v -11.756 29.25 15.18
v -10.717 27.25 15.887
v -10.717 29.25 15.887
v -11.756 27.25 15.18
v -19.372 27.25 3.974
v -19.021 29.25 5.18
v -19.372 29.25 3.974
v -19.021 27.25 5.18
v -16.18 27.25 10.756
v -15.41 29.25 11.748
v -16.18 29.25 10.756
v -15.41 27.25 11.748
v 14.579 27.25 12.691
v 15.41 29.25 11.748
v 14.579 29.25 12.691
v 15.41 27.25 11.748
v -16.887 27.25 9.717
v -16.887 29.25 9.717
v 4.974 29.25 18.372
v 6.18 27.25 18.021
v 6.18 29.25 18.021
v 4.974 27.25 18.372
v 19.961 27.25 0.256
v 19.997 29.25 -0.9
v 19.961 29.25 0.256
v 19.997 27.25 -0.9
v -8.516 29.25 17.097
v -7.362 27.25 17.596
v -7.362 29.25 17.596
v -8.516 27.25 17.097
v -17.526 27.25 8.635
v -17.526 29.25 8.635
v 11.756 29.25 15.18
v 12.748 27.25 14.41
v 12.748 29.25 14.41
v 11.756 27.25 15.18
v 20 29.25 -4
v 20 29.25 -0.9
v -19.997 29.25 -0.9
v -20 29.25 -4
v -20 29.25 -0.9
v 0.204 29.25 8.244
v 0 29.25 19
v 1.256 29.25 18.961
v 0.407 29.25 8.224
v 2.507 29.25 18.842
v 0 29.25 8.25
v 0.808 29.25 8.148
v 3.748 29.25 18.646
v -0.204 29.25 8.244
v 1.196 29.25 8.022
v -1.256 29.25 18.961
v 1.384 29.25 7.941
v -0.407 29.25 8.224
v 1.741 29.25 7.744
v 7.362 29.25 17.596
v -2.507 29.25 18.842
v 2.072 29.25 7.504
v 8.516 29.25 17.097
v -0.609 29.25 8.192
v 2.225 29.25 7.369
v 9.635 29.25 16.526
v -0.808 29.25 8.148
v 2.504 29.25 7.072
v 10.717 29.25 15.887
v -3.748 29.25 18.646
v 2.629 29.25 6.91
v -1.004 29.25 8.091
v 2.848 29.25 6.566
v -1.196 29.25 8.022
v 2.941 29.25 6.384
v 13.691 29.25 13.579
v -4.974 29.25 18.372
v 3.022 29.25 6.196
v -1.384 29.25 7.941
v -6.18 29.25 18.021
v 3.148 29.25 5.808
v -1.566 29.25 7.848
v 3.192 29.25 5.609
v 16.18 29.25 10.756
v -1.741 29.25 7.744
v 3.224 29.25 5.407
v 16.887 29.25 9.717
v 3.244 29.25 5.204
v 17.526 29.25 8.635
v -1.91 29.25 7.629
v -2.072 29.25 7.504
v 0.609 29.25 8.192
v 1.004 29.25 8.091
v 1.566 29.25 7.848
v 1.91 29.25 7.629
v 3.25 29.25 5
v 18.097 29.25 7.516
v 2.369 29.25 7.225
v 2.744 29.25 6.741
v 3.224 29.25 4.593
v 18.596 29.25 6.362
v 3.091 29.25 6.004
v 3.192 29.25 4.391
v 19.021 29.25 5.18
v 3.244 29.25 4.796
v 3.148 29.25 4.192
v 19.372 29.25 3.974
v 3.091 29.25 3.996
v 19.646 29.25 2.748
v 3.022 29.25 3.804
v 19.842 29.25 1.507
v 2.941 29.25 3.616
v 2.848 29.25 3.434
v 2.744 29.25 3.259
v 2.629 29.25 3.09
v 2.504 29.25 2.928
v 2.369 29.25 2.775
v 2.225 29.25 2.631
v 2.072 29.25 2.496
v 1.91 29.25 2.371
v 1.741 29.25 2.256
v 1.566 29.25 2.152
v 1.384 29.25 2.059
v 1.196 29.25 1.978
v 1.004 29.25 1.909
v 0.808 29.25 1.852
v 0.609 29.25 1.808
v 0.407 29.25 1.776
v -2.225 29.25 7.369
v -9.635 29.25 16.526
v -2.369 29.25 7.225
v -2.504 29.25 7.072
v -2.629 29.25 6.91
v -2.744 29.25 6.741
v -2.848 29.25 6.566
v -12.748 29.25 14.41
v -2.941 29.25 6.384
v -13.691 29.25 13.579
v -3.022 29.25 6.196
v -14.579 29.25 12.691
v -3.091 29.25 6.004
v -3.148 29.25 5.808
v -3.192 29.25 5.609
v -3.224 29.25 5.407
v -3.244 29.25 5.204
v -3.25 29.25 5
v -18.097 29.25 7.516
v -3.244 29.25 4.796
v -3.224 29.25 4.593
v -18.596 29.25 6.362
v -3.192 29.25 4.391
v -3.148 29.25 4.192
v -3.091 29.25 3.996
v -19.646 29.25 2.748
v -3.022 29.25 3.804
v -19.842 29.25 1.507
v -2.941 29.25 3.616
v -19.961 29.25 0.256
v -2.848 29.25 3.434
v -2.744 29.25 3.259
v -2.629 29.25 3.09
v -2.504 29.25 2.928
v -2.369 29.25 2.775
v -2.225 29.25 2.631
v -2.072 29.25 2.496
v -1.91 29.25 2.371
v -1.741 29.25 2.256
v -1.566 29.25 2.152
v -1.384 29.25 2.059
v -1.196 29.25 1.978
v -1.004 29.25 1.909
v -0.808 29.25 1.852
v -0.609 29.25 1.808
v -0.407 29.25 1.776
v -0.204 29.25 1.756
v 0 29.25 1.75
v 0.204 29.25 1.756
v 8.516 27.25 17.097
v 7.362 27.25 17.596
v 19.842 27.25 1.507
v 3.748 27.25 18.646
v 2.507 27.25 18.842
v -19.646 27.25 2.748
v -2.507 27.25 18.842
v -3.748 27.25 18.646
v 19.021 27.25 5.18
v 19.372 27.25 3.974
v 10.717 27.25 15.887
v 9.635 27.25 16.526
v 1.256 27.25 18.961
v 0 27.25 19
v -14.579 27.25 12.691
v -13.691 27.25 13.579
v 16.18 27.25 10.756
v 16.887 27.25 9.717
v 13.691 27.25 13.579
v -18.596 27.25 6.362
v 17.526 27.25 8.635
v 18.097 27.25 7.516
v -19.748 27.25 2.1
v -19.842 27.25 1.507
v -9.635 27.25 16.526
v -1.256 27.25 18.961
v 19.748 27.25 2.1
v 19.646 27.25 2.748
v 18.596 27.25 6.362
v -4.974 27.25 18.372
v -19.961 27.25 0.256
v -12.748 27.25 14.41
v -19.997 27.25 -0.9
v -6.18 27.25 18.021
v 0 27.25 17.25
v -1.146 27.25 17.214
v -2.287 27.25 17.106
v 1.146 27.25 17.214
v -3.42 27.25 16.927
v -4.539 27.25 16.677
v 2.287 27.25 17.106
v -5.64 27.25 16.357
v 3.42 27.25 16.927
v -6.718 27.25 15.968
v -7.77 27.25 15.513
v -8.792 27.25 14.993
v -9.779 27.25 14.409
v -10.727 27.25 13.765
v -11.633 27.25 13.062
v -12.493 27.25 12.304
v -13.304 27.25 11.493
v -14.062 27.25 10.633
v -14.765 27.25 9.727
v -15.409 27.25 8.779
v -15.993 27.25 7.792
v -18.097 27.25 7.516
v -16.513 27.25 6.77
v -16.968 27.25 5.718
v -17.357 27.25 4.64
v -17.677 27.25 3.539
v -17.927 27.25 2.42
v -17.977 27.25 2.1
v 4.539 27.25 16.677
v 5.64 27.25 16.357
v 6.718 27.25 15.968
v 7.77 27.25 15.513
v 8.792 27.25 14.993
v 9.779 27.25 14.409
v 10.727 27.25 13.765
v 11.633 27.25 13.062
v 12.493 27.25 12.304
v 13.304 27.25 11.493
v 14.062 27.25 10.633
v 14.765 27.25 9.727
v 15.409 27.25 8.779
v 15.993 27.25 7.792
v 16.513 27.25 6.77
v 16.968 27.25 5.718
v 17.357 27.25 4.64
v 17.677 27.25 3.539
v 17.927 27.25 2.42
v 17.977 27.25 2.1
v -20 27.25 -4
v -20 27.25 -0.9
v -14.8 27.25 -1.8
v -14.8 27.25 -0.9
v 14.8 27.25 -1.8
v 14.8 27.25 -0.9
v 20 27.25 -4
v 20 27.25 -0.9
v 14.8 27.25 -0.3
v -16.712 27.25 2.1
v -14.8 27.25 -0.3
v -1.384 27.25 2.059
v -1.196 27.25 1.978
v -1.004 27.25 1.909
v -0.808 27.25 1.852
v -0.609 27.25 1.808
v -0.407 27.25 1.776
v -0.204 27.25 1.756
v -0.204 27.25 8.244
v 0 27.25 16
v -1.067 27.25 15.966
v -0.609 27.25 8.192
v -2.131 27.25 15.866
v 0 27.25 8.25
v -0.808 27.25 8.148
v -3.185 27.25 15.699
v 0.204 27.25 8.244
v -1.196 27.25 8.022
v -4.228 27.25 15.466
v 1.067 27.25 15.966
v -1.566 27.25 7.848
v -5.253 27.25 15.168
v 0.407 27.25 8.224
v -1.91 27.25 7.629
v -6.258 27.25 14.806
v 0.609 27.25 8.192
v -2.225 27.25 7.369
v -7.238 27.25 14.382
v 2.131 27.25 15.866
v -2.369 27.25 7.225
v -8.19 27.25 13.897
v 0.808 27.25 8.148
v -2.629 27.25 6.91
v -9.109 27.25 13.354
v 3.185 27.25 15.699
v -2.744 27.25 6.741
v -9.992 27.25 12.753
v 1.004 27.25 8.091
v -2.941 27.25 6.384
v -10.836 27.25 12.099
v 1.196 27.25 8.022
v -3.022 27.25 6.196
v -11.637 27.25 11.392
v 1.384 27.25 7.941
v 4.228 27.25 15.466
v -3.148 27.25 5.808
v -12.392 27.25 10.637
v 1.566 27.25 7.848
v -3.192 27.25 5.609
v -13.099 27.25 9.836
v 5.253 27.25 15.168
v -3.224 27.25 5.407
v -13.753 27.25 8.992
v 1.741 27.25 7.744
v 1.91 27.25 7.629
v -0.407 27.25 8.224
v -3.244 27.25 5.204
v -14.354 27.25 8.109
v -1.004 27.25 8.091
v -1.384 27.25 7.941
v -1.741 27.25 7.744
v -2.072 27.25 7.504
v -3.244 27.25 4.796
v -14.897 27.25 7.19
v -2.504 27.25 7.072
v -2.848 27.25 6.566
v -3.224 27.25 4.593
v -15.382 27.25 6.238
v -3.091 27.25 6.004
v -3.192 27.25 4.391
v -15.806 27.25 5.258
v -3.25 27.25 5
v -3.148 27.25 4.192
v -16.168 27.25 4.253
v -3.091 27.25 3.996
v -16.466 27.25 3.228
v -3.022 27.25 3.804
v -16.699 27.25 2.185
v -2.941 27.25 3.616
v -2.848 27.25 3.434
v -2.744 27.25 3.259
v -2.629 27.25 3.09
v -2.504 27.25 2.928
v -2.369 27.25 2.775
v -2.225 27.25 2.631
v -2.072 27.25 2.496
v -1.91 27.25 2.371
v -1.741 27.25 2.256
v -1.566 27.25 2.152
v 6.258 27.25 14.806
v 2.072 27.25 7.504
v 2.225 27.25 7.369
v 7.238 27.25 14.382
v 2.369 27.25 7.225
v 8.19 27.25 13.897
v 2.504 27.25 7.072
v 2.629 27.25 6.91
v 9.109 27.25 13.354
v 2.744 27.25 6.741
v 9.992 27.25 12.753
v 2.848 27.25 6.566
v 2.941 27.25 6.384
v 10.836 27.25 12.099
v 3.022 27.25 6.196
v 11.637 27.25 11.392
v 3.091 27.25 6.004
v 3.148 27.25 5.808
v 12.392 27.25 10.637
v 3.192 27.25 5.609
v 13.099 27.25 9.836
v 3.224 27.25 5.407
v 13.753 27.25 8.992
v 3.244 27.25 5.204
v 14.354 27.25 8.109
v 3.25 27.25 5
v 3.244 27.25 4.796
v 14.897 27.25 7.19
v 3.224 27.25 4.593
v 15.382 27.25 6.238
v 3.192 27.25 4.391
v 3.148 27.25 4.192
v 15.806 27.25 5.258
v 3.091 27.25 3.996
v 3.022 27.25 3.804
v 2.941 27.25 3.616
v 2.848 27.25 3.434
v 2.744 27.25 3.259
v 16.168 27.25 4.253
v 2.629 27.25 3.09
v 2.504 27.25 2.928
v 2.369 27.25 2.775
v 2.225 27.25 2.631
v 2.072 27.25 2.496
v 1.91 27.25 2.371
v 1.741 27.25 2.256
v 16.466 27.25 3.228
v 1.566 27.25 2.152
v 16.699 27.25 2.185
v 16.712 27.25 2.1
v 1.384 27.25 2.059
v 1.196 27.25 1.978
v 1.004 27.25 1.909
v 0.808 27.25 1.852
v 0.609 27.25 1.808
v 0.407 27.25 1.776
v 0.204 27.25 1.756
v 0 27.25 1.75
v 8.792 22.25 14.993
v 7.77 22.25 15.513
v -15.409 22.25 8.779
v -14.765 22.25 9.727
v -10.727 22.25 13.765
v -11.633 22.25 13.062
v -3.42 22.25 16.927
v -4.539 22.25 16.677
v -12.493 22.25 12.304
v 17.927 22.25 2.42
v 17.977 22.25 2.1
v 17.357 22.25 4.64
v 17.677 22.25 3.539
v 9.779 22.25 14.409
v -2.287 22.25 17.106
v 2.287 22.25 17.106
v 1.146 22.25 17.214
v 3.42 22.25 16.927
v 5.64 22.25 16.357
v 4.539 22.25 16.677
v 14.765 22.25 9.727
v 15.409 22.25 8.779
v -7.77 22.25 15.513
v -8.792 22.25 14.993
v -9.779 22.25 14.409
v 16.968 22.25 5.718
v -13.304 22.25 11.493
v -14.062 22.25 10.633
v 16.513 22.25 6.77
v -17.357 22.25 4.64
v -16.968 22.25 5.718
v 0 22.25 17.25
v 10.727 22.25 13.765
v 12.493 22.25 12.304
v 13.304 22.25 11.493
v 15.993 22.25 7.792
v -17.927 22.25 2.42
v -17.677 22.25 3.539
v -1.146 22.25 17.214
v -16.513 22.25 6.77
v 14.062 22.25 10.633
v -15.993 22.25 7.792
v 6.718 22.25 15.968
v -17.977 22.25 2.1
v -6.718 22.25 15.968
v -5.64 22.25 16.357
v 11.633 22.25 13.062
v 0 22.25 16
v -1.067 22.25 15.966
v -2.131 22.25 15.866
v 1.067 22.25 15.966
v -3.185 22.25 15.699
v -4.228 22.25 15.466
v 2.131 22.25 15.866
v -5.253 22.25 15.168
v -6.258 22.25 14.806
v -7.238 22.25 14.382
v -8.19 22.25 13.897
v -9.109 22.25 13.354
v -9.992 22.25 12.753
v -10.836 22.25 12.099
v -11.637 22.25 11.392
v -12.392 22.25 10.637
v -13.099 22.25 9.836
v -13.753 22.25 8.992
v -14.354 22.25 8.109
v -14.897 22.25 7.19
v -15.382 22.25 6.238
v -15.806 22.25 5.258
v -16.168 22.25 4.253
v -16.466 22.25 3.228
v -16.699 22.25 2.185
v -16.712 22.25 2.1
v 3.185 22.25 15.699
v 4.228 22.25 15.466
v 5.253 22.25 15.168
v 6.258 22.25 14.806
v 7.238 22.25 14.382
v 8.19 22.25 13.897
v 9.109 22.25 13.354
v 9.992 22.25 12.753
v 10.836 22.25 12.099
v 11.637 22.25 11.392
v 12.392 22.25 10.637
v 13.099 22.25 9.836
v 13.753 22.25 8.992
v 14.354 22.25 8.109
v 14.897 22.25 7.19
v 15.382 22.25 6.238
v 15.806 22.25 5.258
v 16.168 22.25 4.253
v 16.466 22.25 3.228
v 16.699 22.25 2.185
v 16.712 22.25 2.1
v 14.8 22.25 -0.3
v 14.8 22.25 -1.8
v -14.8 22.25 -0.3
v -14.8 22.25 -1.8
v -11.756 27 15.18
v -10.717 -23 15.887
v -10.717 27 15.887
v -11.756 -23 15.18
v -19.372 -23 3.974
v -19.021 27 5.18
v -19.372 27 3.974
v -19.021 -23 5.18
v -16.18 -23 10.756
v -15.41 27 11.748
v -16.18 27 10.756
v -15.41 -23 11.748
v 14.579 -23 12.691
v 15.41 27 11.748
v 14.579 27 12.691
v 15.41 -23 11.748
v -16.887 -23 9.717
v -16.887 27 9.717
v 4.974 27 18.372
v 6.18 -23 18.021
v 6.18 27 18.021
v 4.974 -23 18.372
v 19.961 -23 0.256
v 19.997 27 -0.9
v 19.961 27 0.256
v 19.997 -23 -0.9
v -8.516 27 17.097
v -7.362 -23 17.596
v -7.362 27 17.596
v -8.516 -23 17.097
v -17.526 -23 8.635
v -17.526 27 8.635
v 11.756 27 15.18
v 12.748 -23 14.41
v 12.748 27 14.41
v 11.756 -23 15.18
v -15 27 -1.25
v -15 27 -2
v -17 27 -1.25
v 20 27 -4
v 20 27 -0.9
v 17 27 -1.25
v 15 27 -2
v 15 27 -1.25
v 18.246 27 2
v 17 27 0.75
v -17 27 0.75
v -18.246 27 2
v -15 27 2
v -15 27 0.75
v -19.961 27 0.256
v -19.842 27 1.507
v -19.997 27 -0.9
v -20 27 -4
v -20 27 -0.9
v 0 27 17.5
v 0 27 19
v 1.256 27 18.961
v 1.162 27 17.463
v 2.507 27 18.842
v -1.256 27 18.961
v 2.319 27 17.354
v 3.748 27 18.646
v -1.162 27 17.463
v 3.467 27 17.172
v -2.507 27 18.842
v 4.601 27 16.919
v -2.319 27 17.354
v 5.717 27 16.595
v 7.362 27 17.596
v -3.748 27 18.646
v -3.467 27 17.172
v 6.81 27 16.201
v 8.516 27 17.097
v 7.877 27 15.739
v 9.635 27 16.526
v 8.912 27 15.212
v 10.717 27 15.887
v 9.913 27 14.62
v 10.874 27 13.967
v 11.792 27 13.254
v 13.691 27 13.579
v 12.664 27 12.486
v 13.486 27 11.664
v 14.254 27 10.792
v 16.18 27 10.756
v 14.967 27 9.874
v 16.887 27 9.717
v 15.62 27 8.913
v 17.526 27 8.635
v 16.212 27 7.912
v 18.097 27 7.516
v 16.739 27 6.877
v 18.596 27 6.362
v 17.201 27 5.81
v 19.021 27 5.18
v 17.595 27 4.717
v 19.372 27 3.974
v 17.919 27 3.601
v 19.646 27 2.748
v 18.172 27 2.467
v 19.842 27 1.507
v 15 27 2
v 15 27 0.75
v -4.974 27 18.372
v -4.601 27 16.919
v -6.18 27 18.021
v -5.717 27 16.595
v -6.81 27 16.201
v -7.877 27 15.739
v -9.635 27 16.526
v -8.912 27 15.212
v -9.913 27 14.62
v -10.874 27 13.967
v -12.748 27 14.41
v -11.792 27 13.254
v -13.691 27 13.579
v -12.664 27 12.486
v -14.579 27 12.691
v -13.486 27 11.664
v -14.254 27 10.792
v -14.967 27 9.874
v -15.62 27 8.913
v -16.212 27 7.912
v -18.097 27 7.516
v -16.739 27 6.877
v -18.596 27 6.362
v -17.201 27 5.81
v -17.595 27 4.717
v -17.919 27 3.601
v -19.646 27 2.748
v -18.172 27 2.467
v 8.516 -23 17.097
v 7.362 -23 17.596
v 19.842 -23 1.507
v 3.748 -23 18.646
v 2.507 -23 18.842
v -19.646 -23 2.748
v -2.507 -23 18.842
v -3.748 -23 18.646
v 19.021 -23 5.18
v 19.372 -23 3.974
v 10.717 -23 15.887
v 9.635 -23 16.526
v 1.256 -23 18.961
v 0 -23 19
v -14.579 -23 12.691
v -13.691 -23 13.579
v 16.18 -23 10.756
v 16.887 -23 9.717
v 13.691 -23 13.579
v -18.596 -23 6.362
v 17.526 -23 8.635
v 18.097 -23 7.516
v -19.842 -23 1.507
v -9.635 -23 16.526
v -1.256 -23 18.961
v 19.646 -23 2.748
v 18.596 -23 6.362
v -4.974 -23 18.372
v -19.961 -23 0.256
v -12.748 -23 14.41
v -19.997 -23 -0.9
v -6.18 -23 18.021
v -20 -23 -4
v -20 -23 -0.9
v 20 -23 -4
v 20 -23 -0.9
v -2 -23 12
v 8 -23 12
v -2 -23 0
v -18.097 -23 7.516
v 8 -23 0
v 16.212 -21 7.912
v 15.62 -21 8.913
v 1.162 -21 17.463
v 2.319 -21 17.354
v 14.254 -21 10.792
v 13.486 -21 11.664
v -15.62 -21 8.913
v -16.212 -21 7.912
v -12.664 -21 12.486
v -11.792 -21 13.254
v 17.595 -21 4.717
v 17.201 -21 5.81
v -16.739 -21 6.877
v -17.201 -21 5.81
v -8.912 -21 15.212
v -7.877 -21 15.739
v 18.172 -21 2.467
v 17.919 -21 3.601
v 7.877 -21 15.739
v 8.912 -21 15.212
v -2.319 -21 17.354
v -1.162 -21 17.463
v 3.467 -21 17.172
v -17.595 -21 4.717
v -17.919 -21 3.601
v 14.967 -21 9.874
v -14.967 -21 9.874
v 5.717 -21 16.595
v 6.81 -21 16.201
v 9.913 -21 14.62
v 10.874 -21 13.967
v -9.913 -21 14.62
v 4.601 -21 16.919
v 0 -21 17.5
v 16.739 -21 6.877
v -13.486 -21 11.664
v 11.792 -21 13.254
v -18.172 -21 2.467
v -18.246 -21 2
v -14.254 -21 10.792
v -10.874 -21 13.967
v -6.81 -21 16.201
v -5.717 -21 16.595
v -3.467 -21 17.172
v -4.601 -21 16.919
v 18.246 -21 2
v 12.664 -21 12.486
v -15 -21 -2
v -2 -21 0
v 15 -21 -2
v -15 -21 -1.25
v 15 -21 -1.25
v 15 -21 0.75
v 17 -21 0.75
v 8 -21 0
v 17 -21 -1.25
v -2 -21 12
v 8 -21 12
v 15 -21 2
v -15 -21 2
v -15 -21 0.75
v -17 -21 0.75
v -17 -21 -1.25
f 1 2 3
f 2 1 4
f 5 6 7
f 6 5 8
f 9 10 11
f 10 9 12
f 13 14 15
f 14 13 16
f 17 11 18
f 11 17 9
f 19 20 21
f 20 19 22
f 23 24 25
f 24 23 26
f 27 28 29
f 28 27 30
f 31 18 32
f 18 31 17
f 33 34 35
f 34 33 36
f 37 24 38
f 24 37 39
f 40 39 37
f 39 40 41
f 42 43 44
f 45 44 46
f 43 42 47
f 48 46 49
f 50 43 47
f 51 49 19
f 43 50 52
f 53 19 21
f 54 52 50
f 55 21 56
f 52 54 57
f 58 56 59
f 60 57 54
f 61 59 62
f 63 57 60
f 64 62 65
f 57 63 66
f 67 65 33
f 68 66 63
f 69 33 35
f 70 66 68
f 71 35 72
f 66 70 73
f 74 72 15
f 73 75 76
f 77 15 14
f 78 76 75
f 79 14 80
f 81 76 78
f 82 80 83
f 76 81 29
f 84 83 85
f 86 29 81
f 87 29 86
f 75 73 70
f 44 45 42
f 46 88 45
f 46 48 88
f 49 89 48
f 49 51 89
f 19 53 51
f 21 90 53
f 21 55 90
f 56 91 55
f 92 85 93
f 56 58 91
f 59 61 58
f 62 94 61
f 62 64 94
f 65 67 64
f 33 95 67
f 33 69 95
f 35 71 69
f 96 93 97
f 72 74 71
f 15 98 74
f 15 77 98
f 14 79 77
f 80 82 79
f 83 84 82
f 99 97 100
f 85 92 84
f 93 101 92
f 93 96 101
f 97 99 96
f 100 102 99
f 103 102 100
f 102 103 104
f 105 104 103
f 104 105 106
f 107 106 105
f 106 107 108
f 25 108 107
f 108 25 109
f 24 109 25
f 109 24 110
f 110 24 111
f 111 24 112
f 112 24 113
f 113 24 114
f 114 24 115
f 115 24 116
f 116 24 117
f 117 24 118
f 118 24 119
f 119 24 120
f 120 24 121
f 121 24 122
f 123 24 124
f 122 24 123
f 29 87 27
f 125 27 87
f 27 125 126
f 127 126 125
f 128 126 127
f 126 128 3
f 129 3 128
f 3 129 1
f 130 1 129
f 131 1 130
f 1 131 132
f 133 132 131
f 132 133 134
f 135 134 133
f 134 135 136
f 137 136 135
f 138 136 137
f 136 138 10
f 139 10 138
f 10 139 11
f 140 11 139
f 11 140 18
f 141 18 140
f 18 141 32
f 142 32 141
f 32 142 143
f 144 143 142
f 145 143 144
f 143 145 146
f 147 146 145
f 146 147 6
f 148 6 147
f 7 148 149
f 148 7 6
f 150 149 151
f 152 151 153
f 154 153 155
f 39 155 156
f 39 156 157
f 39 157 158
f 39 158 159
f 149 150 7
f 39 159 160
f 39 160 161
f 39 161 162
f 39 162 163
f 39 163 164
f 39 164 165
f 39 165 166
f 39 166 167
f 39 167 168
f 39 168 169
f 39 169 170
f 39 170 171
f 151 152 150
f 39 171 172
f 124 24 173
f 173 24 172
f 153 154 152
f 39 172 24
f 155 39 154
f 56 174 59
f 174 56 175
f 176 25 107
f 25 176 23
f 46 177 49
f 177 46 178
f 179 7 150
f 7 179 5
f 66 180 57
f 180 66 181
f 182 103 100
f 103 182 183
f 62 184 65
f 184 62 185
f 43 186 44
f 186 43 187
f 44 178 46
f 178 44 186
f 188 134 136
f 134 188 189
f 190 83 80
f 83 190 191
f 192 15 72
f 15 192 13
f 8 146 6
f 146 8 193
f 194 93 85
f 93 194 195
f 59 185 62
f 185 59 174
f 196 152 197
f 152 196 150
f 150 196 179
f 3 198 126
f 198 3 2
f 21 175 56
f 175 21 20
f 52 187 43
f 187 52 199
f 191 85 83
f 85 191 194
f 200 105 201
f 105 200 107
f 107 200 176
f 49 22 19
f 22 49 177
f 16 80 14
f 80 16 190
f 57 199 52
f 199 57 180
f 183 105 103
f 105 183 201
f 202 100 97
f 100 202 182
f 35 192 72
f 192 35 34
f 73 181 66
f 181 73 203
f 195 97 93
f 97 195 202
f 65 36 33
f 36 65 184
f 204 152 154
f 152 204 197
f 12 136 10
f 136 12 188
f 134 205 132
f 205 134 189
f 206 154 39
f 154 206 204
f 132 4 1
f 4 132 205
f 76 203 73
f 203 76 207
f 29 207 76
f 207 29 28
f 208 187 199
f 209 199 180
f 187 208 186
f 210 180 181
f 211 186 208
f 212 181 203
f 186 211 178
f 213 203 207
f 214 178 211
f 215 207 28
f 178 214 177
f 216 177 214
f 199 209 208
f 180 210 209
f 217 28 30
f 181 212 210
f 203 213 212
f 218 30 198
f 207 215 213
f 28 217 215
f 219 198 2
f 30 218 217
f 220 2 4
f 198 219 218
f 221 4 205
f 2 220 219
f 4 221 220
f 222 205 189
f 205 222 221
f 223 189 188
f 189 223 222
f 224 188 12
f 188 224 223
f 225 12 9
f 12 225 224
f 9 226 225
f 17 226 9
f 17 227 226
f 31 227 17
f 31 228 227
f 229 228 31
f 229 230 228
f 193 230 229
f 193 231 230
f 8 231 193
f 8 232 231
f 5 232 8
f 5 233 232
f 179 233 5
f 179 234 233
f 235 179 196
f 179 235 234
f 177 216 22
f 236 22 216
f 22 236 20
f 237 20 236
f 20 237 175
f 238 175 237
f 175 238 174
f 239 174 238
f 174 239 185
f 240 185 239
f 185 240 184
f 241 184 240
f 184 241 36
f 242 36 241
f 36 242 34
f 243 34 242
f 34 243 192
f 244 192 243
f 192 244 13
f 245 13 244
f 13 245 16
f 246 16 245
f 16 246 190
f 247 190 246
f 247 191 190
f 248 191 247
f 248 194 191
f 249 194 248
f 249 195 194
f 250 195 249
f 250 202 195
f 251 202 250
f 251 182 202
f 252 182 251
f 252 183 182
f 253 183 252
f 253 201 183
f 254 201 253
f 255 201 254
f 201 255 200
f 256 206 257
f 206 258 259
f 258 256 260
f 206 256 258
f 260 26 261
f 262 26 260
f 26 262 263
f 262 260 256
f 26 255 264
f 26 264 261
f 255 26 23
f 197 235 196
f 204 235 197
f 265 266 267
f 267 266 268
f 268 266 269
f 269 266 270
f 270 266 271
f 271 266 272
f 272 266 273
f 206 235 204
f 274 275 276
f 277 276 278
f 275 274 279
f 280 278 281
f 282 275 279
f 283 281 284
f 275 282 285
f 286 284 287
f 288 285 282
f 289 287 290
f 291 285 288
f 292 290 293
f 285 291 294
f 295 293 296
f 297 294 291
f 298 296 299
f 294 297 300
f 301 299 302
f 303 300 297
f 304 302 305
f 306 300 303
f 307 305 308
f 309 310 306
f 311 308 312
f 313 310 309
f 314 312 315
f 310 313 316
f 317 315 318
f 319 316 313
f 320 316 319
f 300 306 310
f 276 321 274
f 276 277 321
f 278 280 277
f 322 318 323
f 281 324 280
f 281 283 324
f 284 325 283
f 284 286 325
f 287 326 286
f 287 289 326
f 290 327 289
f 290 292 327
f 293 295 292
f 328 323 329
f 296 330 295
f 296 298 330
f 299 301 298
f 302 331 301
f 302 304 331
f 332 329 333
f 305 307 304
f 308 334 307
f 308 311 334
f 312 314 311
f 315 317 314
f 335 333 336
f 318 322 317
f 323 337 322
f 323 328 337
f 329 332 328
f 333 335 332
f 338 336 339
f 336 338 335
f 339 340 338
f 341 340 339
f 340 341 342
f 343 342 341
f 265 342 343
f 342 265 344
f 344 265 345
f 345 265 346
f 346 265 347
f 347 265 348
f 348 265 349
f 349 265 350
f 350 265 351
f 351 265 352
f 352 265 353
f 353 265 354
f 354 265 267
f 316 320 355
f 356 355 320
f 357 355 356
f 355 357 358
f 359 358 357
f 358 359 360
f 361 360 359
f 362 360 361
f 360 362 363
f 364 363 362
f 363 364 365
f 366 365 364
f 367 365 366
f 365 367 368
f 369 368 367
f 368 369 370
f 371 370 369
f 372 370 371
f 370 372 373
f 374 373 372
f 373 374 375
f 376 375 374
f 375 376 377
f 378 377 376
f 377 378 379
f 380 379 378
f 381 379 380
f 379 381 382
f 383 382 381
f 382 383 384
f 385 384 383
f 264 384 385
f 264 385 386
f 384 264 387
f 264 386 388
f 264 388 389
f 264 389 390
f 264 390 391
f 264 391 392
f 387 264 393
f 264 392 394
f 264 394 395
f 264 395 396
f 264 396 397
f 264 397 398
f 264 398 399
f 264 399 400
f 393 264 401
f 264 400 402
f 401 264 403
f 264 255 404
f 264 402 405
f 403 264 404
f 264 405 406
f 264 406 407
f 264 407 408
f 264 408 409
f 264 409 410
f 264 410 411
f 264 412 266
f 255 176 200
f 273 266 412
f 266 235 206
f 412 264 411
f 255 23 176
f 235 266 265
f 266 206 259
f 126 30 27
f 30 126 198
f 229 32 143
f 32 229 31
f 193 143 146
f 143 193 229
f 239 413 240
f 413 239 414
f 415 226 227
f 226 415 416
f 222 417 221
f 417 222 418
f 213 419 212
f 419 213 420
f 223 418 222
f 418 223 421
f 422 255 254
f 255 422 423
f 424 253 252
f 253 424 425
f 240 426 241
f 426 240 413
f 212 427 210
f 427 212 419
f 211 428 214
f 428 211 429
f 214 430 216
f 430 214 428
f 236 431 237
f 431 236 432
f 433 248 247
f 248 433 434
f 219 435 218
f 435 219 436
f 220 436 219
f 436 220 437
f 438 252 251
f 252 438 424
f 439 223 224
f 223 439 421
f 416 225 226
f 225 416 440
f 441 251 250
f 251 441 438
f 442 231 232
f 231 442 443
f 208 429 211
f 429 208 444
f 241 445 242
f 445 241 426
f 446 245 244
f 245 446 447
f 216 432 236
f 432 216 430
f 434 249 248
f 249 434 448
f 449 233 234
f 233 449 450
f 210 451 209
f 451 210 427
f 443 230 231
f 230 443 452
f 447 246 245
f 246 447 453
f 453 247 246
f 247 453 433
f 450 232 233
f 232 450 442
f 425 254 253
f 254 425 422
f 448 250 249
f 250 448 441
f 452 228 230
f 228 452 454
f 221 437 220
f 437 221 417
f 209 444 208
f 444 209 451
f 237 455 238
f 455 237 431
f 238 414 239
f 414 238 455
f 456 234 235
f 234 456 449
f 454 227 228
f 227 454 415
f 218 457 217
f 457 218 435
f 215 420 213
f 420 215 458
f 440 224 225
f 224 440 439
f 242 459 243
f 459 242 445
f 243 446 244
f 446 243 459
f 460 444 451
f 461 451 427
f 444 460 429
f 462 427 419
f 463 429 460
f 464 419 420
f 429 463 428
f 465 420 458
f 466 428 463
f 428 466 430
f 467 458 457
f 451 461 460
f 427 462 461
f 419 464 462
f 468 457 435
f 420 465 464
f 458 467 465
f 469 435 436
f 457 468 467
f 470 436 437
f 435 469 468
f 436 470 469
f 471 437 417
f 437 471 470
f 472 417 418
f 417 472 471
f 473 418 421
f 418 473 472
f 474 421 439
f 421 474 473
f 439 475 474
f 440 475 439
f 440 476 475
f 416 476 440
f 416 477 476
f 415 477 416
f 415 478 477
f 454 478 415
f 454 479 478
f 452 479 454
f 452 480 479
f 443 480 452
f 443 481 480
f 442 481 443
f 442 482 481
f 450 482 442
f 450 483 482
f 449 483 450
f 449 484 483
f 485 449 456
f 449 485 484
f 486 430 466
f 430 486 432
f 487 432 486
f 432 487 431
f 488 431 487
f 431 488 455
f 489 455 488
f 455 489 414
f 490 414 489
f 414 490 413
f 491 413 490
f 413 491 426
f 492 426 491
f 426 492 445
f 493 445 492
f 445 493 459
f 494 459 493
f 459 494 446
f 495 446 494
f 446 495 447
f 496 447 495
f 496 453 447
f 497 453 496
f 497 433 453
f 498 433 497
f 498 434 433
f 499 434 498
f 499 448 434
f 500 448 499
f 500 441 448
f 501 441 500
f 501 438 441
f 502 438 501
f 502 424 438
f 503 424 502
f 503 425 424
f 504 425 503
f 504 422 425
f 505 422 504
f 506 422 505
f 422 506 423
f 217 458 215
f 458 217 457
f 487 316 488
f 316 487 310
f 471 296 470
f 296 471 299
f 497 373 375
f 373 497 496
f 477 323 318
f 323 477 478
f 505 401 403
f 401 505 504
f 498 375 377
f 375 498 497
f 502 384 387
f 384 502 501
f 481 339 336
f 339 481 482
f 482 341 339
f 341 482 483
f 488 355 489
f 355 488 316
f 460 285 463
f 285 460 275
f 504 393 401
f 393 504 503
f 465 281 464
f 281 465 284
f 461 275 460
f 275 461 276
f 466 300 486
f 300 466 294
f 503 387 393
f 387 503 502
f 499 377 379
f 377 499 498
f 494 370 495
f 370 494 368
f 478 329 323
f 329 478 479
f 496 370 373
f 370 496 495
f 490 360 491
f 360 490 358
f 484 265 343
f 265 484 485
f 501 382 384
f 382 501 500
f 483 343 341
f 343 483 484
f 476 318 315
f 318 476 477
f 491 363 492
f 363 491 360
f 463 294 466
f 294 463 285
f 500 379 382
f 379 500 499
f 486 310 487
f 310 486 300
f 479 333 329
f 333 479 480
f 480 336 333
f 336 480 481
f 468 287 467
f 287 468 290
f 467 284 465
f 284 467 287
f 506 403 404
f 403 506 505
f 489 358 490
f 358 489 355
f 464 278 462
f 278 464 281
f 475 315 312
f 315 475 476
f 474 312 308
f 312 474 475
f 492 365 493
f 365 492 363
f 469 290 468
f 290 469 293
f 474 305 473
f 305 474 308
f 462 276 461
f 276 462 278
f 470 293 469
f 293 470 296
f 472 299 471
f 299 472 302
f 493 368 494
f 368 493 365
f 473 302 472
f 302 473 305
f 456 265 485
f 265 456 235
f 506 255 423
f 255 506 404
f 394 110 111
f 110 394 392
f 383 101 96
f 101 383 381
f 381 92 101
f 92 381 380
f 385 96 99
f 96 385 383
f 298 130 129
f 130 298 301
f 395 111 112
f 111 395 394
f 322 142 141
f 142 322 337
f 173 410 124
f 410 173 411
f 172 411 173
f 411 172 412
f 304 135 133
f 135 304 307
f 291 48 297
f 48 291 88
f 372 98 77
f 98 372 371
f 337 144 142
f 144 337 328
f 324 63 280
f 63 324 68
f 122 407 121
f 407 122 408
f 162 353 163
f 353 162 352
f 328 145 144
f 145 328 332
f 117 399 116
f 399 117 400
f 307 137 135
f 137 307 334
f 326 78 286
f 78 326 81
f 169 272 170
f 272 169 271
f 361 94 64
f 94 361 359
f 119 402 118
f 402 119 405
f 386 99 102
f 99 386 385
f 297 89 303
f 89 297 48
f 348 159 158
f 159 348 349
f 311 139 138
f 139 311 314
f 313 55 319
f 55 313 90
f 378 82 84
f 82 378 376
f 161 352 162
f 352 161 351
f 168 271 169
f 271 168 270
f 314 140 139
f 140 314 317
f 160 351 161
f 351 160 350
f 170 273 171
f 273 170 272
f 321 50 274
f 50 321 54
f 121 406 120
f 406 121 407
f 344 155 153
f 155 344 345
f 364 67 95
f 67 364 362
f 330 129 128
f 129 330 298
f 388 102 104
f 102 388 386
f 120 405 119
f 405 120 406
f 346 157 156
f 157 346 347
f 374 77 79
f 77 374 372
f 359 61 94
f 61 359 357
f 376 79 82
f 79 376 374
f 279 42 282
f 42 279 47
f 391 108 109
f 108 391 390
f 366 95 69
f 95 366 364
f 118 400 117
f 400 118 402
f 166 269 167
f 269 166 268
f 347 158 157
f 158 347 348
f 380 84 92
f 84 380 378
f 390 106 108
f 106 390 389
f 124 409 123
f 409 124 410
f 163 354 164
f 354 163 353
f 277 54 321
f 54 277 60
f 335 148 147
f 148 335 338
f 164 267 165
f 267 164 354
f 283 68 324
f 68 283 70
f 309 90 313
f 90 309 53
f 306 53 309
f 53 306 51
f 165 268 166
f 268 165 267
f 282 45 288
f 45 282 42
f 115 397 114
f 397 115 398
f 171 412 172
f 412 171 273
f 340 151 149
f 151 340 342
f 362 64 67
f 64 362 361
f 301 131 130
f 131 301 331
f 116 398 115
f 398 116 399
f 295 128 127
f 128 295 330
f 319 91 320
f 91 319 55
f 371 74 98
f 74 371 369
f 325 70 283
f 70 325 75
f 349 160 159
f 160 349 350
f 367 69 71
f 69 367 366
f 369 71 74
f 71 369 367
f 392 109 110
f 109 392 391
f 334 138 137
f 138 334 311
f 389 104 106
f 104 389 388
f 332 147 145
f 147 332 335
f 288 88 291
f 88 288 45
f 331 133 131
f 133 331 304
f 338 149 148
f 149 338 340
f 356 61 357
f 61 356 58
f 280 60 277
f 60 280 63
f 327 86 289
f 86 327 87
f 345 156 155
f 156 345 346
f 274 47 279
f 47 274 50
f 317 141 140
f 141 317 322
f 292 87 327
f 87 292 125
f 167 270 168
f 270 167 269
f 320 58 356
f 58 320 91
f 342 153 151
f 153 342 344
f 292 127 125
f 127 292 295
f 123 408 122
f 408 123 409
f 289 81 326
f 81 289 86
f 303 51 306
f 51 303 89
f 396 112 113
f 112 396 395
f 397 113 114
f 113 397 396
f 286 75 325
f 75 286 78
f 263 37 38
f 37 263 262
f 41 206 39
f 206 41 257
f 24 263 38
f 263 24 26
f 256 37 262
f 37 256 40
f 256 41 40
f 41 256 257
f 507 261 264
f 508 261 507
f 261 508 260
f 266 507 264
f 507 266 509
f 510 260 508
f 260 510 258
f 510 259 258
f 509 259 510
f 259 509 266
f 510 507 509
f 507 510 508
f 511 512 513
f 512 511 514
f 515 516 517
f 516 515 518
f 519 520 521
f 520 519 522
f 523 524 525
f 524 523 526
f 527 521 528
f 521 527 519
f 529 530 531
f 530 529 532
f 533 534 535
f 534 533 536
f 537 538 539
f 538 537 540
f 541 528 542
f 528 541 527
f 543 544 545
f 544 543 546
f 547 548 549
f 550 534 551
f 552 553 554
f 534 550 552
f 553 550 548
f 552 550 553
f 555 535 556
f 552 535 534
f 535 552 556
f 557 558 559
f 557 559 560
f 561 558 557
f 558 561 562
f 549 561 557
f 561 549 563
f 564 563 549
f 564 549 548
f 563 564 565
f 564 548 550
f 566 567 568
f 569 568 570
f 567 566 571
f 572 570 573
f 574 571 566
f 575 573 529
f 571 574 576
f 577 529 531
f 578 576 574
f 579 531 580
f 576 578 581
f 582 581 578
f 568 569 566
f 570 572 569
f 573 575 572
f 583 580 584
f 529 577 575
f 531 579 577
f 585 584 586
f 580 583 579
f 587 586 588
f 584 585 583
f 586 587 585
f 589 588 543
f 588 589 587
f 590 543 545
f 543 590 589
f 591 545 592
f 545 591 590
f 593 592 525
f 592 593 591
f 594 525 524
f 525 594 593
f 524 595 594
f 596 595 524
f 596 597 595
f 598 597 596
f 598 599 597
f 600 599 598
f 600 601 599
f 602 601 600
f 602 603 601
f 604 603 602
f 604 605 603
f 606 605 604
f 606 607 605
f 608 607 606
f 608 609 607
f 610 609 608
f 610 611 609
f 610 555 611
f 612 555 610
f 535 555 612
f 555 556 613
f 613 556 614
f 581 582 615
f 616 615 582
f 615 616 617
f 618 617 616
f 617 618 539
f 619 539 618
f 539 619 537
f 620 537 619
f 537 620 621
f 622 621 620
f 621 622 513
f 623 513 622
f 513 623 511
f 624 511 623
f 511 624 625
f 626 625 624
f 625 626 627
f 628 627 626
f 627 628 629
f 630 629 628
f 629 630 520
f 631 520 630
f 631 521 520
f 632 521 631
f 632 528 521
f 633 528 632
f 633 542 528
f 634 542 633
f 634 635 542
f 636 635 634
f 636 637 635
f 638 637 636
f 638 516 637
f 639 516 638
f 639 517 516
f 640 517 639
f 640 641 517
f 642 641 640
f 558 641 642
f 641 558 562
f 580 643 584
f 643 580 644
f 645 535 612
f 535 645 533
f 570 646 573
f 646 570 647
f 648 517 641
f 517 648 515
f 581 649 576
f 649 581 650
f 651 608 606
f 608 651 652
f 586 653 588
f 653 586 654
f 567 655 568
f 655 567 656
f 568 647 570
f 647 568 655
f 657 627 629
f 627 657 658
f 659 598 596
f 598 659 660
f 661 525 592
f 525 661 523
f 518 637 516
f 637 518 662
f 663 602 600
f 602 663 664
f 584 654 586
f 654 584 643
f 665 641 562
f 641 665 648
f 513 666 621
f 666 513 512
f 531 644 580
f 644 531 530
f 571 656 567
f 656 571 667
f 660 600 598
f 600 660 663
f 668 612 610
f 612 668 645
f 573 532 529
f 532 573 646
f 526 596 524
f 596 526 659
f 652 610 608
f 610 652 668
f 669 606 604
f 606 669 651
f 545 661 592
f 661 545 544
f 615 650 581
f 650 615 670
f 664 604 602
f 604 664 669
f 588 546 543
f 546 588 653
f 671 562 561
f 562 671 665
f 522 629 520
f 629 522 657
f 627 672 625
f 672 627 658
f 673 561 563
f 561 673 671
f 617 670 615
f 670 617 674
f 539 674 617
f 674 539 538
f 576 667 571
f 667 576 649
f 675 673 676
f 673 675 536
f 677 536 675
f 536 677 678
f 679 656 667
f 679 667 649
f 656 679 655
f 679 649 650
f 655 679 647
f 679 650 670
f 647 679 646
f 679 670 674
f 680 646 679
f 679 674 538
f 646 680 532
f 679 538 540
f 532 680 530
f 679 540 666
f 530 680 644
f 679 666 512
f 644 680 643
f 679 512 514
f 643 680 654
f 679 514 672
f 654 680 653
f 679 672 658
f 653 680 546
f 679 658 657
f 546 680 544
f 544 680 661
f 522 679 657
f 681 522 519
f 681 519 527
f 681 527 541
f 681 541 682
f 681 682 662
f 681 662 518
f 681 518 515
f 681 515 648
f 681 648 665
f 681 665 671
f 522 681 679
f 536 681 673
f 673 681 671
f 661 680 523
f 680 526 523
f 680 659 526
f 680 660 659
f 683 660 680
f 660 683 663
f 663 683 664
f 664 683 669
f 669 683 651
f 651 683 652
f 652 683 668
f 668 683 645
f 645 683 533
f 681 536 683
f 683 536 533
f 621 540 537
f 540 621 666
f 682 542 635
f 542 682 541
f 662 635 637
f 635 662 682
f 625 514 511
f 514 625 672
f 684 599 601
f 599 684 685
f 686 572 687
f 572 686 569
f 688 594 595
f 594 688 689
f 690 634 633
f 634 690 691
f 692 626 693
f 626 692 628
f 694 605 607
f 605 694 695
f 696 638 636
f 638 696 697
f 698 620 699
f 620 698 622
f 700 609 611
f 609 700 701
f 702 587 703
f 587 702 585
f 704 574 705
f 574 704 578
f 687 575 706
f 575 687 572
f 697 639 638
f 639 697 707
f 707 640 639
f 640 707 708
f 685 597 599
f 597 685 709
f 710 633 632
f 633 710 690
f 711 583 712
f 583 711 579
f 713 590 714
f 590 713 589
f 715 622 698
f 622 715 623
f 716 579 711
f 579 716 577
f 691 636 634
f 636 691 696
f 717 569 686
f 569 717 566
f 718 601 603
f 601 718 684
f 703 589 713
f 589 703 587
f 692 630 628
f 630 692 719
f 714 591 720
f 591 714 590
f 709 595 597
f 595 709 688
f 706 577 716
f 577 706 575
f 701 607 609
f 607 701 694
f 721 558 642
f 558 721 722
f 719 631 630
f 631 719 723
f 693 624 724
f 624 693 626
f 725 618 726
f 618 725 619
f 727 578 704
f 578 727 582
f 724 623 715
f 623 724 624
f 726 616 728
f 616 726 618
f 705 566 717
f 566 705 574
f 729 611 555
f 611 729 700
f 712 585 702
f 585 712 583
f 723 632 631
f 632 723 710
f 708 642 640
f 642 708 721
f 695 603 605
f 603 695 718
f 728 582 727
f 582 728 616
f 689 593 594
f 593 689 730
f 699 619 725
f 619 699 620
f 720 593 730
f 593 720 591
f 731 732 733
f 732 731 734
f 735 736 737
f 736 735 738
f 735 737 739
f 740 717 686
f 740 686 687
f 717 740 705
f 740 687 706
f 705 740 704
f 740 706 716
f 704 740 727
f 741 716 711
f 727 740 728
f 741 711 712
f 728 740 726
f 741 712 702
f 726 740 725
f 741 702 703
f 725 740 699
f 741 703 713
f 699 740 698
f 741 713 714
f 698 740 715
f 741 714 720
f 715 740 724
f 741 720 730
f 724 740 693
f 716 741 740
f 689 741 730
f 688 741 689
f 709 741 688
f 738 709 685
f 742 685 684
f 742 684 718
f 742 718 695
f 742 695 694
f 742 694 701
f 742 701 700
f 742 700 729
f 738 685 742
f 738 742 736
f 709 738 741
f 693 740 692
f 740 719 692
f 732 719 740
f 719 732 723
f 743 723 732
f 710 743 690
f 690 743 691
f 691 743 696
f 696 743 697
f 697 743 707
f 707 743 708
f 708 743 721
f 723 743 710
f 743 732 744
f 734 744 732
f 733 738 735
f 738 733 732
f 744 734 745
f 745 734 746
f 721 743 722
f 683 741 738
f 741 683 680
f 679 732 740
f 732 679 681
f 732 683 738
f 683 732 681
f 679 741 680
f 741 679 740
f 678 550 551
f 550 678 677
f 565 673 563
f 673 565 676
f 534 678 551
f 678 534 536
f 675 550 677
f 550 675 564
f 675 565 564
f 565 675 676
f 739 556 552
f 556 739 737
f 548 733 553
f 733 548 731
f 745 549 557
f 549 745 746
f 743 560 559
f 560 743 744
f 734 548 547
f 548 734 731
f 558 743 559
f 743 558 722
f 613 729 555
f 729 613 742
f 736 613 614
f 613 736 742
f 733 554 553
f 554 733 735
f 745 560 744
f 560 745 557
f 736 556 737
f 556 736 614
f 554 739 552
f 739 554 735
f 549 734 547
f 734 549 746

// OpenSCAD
$fn= 100;
da= 40;

module platine()
{
  difference()
  {
    translate([-32/2,-41/2,0]) cube([32,41,1.5]);
    
    translate([ 13, 17.5,-1]) cylinder(d=3.1, h=3);
    translate([-13, 17.5,-1]) cylinder(d=3.1, h=3);
    translate([ 13,-17.5,-1]) cylinder(d=3.1, h=3);    
  }
  
  color("blue") translate([-23/2,16-41/2,13]) cube([23,15,1]);
  
  color("darkgrey") translate([14.5-32/2,-.5-41/2,1.5]) cube([9,15,11]);
  
  color("blue") translate([-15/2,41/2-9,1.5]) cube([15,8,10]);
}

module gehaeuse()
{
  translate([0, -23,-1]) rotate([-90,0,0]) difference()
  {
    cylinder(d=da,h=50);
    
    translate([0,0,2]) cylinder(d=da-3,h=60);
    translate([-da/2-1,0,-1]) cube([da+2, da/2+2, 60]);
    
    translate([14-32/2,-13,-2]) cube([10,12,15]);
  }
  difference()
  {
    translate([-da/2,-23,-4]) cube([da,50,3.1]);
    
    translate([-34/2,-21,-2]) cube([34,50,4]);
    *translate([-34/2,-21,-1.25]) cube([34,50,2]);
  }
  difference()
  {
    union()
    {
      translate([ 1-da/2,-23,-2]) cube([4,50,4]);
      translate([-5+da/2,-23,-2]) cube([4,50,4]);
    }
    translate([-34/2,-21,-1.25]) cube([34,50,2]);
  }
  
}

module deckel()
{
  translate([0, 27.25,-1]) 
  {
    rotate([-90,0,0]) difference()
    {
      union()
      {
        cylinder(d=da,h=2);
        translate([0,0,-5]) cylinder(d=da-3.5,h=5);
      }
      
      translate([0,0,-6]) cylinder(d=da-6,h=6);
      translate([-da/2-1,0,-10]) cube([da+2, da/2+2, 20]);
      
      translate([-da/2-1,-3.1,-6]) cube([da+2, 8, 6]);
      
      translate([0,-6,-1]) cylinder(d=6.5, h=10);
    }
    translate([-da/2, 0, -3]) cube([da,2,3.1]);
    translate([5.2-da/2, -5, -0.8]) cube([da-10.4,5,1.5]);
  }
}

//rotate([-90,0,0]) 
deckel();

//rotate([90,0,0]) 
difference()
{
gehaeuse();

*translate([-25,-25,-10]) cube([50,48,30]);
}
*translate([0,0,-1]) platine();
